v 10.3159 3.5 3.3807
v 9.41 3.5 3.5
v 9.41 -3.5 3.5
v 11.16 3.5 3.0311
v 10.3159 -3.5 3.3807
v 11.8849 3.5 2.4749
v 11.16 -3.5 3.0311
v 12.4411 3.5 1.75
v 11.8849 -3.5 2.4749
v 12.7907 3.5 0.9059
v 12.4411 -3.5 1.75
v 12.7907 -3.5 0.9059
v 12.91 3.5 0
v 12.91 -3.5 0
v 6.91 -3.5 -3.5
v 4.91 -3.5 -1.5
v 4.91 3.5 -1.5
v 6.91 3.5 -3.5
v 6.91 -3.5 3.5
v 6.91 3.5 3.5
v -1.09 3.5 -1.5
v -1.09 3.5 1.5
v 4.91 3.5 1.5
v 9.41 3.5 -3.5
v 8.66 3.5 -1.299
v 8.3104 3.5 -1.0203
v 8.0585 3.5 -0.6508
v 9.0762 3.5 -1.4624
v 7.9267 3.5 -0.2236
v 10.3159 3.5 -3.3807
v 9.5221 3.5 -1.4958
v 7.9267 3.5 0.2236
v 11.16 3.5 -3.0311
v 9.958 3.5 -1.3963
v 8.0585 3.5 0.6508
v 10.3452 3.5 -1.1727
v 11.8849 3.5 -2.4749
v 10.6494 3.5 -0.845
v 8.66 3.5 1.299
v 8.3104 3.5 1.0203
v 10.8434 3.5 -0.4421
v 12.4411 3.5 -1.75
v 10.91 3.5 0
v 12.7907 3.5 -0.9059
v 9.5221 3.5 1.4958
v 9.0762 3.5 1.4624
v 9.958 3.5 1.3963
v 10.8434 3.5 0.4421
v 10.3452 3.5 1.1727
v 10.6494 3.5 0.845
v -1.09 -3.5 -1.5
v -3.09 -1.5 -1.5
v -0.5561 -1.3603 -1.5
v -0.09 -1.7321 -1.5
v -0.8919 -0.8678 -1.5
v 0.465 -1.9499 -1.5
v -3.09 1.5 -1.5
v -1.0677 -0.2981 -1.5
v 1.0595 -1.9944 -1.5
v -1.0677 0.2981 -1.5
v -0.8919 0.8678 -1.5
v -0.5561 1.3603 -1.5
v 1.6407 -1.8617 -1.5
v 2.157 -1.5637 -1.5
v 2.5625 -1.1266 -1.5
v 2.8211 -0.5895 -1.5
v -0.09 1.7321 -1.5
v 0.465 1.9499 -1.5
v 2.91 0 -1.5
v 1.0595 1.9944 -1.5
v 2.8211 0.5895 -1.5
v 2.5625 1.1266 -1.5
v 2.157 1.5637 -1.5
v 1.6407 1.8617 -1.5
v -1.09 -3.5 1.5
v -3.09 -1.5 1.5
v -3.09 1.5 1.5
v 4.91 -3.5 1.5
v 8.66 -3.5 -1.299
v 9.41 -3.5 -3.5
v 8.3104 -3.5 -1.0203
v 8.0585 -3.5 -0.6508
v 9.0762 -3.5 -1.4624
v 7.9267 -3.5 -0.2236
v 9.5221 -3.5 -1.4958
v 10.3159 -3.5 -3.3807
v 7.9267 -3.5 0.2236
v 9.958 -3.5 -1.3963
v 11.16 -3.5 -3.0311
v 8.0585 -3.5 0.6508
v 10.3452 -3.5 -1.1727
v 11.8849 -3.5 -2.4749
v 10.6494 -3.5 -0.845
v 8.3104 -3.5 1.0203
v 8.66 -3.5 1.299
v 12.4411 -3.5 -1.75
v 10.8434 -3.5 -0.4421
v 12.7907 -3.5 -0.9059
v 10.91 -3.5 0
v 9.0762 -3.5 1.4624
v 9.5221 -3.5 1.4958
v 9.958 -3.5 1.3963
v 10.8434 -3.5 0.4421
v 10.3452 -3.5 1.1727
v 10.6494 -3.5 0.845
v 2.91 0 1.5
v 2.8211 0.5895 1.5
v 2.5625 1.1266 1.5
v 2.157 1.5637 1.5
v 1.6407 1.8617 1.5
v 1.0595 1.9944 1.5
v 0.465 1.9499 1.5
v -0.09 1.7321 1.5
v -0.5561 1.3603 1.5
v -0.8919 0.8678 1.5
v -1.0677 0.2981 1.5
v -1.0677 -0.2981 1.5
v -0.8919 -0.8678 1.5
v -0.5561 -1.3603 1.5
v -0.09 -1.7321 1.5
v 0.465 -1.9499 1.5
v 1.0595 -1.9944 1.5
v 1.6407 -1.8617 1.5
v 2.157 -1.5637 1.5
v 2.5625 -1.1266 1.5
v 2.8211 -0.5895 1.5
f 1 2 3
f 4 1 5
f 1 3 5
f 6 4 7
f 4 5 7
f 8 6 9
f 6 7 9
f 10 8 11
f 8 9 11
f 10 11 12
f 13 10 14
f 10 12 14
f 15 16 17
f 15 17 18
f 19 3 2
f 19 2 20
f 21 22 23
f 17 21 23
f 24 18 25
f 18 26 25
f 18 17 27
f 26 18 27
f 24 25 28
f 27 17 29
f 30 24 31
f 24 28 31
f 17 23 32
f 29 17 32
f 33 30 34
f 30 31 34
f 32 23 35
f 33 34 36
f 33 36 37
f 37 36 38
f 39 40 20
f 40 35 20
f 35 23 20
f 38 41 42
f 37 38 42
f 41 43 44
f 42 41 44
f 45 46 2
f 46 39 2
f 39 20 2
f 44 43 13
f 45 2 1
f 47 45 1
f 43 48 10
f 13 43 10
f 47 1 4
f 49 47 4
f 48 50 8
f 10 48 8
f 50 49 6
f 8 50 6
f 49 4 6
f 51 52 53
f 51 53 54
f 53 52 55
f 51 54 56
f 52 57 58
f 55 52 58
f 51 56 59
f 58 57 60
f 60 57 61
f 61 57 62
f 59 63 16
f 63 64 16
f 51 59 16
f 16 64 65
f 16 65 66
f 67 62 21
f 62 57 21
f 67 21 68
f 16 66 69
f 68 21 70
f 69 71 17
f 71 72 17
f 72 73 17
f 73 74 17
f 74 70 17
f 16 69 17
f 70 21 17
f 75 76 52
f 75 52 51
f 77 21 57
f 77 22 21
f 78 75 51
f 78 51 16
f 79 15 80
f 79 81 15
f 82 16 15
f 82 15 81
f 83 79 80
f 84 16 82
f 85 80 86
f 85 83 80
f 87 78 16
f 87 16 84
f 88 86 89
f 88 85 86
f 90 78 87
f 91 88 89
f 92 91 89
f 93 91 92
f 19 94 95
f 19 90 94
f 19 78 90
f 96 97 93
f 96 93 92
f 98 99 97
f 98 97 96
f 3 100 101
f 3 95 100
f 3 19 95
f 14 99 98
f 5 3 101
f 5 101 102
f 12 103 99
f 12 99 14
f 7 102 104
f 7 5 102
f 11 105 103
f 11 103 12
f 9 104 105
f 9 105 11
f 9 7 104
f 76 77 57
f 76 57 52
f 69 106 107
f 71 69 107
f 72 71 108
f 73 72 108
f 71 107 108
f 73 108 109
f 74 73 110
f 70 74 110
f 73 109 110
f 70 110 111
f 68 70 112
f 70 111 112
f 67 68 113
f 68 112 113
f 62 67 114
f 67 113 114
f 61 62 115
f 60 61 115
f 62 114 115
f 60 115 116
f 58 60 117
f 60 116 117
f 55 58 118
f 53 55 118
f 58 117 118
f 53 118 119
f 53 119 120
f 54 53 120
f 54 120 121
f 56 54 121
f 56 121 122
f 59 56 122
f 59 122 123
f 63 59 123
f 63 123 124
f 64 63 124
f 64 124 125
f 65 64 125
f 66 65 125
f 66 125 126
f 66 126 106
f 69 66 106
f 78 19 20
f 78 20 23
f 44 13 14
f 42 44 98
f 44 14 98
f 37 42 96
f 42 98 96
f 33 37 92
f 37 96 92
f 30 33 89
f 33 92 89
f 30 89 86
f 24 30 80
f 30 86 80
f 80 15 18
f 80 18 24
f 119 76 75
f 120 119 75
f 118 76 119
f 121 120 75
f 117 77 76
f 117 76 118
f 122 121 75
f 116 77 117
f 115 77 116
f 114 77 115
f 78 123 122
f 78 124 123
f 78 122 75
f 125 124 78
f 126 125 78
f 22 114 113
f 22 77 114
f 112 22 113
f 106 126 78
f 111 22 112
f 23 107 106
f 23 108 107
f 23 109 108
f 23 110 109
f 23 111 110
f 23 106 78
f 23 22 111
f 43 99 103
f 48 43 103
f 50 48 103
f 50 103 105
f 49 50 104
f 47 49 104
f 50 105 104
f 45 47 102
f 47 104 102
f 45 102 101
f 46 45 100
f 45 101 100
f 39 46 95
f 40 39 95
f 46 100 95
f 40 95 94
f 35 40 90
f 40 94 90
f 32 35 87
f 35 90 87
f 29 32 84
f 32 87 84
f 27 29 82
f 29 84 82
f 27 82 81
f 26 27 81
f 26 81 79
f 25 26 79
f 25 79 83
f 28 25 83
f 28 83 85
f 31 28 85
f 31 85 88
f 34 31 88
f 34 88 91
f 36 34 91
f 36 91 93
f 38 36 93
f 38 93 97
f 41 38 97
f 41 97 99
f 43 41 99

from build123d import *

# Parameters (mm, degrees)
F1_DEPTH = 1.5
F3_DEPTH = 7
F4_R     = 1.5
F5_DEPTH = 7.001
F6_R     = 2
F7_DEPTH = 5.001
F9_DEPTH = 7.001


with BuildPart() as f1:
    # F0 (on Top) → F1 (new body, symmetric)
    with BuildSketch(Plane.XY):
        Polygon((-1.090006, 3.5), (-3.090006, 1.5), (-3.090006, -1.5), (-1.090006, -3.5), (12.909994, -3.5), (12.909994, 3.5), align=None)
    extrude(amount=F1_DEPTH, both=True)

    # F2 (on face) → F3 (join)
    with BuildSketch(Plane.XZ.offset(3.5)):
        Polygon((6.909994, 3.5), (4.909994, 1.5), (12.909994, 1.5), (12.909994, 3.5), align=None)
        Polygon((12.909994, -1.5), (4.909994, -1.5), (6.909994, -3.5), (12.909994, -3.5), align=None)
    extrude(amount=-F3_DEPTH)

    # F4 (on face) → F5 (cut, through all)
    with BuildSketch(Plane.XZ.offset(3.5)):
        with Locations((9.409994, 0)):
            Circle(F4_R)
    extrude(amount=-F5_DEPTH, mode=Mode.SUBTRACT)

    # F6 (on face) → F7 (cut, through all)
    with BuildSketch(Plane.XY.offset(1.5)):
        with Locations((0.909994, 0)):
            Circle(F6_R)
    extrude(amount=-F7_DEPTH, mode=Mode.SUBTRACT)

    # F8 (on face) → F9 (cut, through all)
    with BuildSketch(Plane.XZ.offset(3.5)):
        with BuildLine():
            ThreePointArc((9.409994, 3.5), (11.884868, 2.474874), (12.909994, 0))
            Line((12.909994, 0), (12.909994, 3.5))
            Line((12.909994, 3.5), (9.409994, 3.5))
        make_face()
        with BuildLine():
            ThreePointArc((12.909994, 0), (11.884868, -2.474874), (9.409994, -3.5))
            Line((9.409994, -3.5), (12.909994, -3.5))
            Line((12.909994, -3.5), (12.909994, 0))
        make_face()
    extrude(amount=-F9_DEPTH, mode=Mode.SUBTRACT)


solid = f1.part
